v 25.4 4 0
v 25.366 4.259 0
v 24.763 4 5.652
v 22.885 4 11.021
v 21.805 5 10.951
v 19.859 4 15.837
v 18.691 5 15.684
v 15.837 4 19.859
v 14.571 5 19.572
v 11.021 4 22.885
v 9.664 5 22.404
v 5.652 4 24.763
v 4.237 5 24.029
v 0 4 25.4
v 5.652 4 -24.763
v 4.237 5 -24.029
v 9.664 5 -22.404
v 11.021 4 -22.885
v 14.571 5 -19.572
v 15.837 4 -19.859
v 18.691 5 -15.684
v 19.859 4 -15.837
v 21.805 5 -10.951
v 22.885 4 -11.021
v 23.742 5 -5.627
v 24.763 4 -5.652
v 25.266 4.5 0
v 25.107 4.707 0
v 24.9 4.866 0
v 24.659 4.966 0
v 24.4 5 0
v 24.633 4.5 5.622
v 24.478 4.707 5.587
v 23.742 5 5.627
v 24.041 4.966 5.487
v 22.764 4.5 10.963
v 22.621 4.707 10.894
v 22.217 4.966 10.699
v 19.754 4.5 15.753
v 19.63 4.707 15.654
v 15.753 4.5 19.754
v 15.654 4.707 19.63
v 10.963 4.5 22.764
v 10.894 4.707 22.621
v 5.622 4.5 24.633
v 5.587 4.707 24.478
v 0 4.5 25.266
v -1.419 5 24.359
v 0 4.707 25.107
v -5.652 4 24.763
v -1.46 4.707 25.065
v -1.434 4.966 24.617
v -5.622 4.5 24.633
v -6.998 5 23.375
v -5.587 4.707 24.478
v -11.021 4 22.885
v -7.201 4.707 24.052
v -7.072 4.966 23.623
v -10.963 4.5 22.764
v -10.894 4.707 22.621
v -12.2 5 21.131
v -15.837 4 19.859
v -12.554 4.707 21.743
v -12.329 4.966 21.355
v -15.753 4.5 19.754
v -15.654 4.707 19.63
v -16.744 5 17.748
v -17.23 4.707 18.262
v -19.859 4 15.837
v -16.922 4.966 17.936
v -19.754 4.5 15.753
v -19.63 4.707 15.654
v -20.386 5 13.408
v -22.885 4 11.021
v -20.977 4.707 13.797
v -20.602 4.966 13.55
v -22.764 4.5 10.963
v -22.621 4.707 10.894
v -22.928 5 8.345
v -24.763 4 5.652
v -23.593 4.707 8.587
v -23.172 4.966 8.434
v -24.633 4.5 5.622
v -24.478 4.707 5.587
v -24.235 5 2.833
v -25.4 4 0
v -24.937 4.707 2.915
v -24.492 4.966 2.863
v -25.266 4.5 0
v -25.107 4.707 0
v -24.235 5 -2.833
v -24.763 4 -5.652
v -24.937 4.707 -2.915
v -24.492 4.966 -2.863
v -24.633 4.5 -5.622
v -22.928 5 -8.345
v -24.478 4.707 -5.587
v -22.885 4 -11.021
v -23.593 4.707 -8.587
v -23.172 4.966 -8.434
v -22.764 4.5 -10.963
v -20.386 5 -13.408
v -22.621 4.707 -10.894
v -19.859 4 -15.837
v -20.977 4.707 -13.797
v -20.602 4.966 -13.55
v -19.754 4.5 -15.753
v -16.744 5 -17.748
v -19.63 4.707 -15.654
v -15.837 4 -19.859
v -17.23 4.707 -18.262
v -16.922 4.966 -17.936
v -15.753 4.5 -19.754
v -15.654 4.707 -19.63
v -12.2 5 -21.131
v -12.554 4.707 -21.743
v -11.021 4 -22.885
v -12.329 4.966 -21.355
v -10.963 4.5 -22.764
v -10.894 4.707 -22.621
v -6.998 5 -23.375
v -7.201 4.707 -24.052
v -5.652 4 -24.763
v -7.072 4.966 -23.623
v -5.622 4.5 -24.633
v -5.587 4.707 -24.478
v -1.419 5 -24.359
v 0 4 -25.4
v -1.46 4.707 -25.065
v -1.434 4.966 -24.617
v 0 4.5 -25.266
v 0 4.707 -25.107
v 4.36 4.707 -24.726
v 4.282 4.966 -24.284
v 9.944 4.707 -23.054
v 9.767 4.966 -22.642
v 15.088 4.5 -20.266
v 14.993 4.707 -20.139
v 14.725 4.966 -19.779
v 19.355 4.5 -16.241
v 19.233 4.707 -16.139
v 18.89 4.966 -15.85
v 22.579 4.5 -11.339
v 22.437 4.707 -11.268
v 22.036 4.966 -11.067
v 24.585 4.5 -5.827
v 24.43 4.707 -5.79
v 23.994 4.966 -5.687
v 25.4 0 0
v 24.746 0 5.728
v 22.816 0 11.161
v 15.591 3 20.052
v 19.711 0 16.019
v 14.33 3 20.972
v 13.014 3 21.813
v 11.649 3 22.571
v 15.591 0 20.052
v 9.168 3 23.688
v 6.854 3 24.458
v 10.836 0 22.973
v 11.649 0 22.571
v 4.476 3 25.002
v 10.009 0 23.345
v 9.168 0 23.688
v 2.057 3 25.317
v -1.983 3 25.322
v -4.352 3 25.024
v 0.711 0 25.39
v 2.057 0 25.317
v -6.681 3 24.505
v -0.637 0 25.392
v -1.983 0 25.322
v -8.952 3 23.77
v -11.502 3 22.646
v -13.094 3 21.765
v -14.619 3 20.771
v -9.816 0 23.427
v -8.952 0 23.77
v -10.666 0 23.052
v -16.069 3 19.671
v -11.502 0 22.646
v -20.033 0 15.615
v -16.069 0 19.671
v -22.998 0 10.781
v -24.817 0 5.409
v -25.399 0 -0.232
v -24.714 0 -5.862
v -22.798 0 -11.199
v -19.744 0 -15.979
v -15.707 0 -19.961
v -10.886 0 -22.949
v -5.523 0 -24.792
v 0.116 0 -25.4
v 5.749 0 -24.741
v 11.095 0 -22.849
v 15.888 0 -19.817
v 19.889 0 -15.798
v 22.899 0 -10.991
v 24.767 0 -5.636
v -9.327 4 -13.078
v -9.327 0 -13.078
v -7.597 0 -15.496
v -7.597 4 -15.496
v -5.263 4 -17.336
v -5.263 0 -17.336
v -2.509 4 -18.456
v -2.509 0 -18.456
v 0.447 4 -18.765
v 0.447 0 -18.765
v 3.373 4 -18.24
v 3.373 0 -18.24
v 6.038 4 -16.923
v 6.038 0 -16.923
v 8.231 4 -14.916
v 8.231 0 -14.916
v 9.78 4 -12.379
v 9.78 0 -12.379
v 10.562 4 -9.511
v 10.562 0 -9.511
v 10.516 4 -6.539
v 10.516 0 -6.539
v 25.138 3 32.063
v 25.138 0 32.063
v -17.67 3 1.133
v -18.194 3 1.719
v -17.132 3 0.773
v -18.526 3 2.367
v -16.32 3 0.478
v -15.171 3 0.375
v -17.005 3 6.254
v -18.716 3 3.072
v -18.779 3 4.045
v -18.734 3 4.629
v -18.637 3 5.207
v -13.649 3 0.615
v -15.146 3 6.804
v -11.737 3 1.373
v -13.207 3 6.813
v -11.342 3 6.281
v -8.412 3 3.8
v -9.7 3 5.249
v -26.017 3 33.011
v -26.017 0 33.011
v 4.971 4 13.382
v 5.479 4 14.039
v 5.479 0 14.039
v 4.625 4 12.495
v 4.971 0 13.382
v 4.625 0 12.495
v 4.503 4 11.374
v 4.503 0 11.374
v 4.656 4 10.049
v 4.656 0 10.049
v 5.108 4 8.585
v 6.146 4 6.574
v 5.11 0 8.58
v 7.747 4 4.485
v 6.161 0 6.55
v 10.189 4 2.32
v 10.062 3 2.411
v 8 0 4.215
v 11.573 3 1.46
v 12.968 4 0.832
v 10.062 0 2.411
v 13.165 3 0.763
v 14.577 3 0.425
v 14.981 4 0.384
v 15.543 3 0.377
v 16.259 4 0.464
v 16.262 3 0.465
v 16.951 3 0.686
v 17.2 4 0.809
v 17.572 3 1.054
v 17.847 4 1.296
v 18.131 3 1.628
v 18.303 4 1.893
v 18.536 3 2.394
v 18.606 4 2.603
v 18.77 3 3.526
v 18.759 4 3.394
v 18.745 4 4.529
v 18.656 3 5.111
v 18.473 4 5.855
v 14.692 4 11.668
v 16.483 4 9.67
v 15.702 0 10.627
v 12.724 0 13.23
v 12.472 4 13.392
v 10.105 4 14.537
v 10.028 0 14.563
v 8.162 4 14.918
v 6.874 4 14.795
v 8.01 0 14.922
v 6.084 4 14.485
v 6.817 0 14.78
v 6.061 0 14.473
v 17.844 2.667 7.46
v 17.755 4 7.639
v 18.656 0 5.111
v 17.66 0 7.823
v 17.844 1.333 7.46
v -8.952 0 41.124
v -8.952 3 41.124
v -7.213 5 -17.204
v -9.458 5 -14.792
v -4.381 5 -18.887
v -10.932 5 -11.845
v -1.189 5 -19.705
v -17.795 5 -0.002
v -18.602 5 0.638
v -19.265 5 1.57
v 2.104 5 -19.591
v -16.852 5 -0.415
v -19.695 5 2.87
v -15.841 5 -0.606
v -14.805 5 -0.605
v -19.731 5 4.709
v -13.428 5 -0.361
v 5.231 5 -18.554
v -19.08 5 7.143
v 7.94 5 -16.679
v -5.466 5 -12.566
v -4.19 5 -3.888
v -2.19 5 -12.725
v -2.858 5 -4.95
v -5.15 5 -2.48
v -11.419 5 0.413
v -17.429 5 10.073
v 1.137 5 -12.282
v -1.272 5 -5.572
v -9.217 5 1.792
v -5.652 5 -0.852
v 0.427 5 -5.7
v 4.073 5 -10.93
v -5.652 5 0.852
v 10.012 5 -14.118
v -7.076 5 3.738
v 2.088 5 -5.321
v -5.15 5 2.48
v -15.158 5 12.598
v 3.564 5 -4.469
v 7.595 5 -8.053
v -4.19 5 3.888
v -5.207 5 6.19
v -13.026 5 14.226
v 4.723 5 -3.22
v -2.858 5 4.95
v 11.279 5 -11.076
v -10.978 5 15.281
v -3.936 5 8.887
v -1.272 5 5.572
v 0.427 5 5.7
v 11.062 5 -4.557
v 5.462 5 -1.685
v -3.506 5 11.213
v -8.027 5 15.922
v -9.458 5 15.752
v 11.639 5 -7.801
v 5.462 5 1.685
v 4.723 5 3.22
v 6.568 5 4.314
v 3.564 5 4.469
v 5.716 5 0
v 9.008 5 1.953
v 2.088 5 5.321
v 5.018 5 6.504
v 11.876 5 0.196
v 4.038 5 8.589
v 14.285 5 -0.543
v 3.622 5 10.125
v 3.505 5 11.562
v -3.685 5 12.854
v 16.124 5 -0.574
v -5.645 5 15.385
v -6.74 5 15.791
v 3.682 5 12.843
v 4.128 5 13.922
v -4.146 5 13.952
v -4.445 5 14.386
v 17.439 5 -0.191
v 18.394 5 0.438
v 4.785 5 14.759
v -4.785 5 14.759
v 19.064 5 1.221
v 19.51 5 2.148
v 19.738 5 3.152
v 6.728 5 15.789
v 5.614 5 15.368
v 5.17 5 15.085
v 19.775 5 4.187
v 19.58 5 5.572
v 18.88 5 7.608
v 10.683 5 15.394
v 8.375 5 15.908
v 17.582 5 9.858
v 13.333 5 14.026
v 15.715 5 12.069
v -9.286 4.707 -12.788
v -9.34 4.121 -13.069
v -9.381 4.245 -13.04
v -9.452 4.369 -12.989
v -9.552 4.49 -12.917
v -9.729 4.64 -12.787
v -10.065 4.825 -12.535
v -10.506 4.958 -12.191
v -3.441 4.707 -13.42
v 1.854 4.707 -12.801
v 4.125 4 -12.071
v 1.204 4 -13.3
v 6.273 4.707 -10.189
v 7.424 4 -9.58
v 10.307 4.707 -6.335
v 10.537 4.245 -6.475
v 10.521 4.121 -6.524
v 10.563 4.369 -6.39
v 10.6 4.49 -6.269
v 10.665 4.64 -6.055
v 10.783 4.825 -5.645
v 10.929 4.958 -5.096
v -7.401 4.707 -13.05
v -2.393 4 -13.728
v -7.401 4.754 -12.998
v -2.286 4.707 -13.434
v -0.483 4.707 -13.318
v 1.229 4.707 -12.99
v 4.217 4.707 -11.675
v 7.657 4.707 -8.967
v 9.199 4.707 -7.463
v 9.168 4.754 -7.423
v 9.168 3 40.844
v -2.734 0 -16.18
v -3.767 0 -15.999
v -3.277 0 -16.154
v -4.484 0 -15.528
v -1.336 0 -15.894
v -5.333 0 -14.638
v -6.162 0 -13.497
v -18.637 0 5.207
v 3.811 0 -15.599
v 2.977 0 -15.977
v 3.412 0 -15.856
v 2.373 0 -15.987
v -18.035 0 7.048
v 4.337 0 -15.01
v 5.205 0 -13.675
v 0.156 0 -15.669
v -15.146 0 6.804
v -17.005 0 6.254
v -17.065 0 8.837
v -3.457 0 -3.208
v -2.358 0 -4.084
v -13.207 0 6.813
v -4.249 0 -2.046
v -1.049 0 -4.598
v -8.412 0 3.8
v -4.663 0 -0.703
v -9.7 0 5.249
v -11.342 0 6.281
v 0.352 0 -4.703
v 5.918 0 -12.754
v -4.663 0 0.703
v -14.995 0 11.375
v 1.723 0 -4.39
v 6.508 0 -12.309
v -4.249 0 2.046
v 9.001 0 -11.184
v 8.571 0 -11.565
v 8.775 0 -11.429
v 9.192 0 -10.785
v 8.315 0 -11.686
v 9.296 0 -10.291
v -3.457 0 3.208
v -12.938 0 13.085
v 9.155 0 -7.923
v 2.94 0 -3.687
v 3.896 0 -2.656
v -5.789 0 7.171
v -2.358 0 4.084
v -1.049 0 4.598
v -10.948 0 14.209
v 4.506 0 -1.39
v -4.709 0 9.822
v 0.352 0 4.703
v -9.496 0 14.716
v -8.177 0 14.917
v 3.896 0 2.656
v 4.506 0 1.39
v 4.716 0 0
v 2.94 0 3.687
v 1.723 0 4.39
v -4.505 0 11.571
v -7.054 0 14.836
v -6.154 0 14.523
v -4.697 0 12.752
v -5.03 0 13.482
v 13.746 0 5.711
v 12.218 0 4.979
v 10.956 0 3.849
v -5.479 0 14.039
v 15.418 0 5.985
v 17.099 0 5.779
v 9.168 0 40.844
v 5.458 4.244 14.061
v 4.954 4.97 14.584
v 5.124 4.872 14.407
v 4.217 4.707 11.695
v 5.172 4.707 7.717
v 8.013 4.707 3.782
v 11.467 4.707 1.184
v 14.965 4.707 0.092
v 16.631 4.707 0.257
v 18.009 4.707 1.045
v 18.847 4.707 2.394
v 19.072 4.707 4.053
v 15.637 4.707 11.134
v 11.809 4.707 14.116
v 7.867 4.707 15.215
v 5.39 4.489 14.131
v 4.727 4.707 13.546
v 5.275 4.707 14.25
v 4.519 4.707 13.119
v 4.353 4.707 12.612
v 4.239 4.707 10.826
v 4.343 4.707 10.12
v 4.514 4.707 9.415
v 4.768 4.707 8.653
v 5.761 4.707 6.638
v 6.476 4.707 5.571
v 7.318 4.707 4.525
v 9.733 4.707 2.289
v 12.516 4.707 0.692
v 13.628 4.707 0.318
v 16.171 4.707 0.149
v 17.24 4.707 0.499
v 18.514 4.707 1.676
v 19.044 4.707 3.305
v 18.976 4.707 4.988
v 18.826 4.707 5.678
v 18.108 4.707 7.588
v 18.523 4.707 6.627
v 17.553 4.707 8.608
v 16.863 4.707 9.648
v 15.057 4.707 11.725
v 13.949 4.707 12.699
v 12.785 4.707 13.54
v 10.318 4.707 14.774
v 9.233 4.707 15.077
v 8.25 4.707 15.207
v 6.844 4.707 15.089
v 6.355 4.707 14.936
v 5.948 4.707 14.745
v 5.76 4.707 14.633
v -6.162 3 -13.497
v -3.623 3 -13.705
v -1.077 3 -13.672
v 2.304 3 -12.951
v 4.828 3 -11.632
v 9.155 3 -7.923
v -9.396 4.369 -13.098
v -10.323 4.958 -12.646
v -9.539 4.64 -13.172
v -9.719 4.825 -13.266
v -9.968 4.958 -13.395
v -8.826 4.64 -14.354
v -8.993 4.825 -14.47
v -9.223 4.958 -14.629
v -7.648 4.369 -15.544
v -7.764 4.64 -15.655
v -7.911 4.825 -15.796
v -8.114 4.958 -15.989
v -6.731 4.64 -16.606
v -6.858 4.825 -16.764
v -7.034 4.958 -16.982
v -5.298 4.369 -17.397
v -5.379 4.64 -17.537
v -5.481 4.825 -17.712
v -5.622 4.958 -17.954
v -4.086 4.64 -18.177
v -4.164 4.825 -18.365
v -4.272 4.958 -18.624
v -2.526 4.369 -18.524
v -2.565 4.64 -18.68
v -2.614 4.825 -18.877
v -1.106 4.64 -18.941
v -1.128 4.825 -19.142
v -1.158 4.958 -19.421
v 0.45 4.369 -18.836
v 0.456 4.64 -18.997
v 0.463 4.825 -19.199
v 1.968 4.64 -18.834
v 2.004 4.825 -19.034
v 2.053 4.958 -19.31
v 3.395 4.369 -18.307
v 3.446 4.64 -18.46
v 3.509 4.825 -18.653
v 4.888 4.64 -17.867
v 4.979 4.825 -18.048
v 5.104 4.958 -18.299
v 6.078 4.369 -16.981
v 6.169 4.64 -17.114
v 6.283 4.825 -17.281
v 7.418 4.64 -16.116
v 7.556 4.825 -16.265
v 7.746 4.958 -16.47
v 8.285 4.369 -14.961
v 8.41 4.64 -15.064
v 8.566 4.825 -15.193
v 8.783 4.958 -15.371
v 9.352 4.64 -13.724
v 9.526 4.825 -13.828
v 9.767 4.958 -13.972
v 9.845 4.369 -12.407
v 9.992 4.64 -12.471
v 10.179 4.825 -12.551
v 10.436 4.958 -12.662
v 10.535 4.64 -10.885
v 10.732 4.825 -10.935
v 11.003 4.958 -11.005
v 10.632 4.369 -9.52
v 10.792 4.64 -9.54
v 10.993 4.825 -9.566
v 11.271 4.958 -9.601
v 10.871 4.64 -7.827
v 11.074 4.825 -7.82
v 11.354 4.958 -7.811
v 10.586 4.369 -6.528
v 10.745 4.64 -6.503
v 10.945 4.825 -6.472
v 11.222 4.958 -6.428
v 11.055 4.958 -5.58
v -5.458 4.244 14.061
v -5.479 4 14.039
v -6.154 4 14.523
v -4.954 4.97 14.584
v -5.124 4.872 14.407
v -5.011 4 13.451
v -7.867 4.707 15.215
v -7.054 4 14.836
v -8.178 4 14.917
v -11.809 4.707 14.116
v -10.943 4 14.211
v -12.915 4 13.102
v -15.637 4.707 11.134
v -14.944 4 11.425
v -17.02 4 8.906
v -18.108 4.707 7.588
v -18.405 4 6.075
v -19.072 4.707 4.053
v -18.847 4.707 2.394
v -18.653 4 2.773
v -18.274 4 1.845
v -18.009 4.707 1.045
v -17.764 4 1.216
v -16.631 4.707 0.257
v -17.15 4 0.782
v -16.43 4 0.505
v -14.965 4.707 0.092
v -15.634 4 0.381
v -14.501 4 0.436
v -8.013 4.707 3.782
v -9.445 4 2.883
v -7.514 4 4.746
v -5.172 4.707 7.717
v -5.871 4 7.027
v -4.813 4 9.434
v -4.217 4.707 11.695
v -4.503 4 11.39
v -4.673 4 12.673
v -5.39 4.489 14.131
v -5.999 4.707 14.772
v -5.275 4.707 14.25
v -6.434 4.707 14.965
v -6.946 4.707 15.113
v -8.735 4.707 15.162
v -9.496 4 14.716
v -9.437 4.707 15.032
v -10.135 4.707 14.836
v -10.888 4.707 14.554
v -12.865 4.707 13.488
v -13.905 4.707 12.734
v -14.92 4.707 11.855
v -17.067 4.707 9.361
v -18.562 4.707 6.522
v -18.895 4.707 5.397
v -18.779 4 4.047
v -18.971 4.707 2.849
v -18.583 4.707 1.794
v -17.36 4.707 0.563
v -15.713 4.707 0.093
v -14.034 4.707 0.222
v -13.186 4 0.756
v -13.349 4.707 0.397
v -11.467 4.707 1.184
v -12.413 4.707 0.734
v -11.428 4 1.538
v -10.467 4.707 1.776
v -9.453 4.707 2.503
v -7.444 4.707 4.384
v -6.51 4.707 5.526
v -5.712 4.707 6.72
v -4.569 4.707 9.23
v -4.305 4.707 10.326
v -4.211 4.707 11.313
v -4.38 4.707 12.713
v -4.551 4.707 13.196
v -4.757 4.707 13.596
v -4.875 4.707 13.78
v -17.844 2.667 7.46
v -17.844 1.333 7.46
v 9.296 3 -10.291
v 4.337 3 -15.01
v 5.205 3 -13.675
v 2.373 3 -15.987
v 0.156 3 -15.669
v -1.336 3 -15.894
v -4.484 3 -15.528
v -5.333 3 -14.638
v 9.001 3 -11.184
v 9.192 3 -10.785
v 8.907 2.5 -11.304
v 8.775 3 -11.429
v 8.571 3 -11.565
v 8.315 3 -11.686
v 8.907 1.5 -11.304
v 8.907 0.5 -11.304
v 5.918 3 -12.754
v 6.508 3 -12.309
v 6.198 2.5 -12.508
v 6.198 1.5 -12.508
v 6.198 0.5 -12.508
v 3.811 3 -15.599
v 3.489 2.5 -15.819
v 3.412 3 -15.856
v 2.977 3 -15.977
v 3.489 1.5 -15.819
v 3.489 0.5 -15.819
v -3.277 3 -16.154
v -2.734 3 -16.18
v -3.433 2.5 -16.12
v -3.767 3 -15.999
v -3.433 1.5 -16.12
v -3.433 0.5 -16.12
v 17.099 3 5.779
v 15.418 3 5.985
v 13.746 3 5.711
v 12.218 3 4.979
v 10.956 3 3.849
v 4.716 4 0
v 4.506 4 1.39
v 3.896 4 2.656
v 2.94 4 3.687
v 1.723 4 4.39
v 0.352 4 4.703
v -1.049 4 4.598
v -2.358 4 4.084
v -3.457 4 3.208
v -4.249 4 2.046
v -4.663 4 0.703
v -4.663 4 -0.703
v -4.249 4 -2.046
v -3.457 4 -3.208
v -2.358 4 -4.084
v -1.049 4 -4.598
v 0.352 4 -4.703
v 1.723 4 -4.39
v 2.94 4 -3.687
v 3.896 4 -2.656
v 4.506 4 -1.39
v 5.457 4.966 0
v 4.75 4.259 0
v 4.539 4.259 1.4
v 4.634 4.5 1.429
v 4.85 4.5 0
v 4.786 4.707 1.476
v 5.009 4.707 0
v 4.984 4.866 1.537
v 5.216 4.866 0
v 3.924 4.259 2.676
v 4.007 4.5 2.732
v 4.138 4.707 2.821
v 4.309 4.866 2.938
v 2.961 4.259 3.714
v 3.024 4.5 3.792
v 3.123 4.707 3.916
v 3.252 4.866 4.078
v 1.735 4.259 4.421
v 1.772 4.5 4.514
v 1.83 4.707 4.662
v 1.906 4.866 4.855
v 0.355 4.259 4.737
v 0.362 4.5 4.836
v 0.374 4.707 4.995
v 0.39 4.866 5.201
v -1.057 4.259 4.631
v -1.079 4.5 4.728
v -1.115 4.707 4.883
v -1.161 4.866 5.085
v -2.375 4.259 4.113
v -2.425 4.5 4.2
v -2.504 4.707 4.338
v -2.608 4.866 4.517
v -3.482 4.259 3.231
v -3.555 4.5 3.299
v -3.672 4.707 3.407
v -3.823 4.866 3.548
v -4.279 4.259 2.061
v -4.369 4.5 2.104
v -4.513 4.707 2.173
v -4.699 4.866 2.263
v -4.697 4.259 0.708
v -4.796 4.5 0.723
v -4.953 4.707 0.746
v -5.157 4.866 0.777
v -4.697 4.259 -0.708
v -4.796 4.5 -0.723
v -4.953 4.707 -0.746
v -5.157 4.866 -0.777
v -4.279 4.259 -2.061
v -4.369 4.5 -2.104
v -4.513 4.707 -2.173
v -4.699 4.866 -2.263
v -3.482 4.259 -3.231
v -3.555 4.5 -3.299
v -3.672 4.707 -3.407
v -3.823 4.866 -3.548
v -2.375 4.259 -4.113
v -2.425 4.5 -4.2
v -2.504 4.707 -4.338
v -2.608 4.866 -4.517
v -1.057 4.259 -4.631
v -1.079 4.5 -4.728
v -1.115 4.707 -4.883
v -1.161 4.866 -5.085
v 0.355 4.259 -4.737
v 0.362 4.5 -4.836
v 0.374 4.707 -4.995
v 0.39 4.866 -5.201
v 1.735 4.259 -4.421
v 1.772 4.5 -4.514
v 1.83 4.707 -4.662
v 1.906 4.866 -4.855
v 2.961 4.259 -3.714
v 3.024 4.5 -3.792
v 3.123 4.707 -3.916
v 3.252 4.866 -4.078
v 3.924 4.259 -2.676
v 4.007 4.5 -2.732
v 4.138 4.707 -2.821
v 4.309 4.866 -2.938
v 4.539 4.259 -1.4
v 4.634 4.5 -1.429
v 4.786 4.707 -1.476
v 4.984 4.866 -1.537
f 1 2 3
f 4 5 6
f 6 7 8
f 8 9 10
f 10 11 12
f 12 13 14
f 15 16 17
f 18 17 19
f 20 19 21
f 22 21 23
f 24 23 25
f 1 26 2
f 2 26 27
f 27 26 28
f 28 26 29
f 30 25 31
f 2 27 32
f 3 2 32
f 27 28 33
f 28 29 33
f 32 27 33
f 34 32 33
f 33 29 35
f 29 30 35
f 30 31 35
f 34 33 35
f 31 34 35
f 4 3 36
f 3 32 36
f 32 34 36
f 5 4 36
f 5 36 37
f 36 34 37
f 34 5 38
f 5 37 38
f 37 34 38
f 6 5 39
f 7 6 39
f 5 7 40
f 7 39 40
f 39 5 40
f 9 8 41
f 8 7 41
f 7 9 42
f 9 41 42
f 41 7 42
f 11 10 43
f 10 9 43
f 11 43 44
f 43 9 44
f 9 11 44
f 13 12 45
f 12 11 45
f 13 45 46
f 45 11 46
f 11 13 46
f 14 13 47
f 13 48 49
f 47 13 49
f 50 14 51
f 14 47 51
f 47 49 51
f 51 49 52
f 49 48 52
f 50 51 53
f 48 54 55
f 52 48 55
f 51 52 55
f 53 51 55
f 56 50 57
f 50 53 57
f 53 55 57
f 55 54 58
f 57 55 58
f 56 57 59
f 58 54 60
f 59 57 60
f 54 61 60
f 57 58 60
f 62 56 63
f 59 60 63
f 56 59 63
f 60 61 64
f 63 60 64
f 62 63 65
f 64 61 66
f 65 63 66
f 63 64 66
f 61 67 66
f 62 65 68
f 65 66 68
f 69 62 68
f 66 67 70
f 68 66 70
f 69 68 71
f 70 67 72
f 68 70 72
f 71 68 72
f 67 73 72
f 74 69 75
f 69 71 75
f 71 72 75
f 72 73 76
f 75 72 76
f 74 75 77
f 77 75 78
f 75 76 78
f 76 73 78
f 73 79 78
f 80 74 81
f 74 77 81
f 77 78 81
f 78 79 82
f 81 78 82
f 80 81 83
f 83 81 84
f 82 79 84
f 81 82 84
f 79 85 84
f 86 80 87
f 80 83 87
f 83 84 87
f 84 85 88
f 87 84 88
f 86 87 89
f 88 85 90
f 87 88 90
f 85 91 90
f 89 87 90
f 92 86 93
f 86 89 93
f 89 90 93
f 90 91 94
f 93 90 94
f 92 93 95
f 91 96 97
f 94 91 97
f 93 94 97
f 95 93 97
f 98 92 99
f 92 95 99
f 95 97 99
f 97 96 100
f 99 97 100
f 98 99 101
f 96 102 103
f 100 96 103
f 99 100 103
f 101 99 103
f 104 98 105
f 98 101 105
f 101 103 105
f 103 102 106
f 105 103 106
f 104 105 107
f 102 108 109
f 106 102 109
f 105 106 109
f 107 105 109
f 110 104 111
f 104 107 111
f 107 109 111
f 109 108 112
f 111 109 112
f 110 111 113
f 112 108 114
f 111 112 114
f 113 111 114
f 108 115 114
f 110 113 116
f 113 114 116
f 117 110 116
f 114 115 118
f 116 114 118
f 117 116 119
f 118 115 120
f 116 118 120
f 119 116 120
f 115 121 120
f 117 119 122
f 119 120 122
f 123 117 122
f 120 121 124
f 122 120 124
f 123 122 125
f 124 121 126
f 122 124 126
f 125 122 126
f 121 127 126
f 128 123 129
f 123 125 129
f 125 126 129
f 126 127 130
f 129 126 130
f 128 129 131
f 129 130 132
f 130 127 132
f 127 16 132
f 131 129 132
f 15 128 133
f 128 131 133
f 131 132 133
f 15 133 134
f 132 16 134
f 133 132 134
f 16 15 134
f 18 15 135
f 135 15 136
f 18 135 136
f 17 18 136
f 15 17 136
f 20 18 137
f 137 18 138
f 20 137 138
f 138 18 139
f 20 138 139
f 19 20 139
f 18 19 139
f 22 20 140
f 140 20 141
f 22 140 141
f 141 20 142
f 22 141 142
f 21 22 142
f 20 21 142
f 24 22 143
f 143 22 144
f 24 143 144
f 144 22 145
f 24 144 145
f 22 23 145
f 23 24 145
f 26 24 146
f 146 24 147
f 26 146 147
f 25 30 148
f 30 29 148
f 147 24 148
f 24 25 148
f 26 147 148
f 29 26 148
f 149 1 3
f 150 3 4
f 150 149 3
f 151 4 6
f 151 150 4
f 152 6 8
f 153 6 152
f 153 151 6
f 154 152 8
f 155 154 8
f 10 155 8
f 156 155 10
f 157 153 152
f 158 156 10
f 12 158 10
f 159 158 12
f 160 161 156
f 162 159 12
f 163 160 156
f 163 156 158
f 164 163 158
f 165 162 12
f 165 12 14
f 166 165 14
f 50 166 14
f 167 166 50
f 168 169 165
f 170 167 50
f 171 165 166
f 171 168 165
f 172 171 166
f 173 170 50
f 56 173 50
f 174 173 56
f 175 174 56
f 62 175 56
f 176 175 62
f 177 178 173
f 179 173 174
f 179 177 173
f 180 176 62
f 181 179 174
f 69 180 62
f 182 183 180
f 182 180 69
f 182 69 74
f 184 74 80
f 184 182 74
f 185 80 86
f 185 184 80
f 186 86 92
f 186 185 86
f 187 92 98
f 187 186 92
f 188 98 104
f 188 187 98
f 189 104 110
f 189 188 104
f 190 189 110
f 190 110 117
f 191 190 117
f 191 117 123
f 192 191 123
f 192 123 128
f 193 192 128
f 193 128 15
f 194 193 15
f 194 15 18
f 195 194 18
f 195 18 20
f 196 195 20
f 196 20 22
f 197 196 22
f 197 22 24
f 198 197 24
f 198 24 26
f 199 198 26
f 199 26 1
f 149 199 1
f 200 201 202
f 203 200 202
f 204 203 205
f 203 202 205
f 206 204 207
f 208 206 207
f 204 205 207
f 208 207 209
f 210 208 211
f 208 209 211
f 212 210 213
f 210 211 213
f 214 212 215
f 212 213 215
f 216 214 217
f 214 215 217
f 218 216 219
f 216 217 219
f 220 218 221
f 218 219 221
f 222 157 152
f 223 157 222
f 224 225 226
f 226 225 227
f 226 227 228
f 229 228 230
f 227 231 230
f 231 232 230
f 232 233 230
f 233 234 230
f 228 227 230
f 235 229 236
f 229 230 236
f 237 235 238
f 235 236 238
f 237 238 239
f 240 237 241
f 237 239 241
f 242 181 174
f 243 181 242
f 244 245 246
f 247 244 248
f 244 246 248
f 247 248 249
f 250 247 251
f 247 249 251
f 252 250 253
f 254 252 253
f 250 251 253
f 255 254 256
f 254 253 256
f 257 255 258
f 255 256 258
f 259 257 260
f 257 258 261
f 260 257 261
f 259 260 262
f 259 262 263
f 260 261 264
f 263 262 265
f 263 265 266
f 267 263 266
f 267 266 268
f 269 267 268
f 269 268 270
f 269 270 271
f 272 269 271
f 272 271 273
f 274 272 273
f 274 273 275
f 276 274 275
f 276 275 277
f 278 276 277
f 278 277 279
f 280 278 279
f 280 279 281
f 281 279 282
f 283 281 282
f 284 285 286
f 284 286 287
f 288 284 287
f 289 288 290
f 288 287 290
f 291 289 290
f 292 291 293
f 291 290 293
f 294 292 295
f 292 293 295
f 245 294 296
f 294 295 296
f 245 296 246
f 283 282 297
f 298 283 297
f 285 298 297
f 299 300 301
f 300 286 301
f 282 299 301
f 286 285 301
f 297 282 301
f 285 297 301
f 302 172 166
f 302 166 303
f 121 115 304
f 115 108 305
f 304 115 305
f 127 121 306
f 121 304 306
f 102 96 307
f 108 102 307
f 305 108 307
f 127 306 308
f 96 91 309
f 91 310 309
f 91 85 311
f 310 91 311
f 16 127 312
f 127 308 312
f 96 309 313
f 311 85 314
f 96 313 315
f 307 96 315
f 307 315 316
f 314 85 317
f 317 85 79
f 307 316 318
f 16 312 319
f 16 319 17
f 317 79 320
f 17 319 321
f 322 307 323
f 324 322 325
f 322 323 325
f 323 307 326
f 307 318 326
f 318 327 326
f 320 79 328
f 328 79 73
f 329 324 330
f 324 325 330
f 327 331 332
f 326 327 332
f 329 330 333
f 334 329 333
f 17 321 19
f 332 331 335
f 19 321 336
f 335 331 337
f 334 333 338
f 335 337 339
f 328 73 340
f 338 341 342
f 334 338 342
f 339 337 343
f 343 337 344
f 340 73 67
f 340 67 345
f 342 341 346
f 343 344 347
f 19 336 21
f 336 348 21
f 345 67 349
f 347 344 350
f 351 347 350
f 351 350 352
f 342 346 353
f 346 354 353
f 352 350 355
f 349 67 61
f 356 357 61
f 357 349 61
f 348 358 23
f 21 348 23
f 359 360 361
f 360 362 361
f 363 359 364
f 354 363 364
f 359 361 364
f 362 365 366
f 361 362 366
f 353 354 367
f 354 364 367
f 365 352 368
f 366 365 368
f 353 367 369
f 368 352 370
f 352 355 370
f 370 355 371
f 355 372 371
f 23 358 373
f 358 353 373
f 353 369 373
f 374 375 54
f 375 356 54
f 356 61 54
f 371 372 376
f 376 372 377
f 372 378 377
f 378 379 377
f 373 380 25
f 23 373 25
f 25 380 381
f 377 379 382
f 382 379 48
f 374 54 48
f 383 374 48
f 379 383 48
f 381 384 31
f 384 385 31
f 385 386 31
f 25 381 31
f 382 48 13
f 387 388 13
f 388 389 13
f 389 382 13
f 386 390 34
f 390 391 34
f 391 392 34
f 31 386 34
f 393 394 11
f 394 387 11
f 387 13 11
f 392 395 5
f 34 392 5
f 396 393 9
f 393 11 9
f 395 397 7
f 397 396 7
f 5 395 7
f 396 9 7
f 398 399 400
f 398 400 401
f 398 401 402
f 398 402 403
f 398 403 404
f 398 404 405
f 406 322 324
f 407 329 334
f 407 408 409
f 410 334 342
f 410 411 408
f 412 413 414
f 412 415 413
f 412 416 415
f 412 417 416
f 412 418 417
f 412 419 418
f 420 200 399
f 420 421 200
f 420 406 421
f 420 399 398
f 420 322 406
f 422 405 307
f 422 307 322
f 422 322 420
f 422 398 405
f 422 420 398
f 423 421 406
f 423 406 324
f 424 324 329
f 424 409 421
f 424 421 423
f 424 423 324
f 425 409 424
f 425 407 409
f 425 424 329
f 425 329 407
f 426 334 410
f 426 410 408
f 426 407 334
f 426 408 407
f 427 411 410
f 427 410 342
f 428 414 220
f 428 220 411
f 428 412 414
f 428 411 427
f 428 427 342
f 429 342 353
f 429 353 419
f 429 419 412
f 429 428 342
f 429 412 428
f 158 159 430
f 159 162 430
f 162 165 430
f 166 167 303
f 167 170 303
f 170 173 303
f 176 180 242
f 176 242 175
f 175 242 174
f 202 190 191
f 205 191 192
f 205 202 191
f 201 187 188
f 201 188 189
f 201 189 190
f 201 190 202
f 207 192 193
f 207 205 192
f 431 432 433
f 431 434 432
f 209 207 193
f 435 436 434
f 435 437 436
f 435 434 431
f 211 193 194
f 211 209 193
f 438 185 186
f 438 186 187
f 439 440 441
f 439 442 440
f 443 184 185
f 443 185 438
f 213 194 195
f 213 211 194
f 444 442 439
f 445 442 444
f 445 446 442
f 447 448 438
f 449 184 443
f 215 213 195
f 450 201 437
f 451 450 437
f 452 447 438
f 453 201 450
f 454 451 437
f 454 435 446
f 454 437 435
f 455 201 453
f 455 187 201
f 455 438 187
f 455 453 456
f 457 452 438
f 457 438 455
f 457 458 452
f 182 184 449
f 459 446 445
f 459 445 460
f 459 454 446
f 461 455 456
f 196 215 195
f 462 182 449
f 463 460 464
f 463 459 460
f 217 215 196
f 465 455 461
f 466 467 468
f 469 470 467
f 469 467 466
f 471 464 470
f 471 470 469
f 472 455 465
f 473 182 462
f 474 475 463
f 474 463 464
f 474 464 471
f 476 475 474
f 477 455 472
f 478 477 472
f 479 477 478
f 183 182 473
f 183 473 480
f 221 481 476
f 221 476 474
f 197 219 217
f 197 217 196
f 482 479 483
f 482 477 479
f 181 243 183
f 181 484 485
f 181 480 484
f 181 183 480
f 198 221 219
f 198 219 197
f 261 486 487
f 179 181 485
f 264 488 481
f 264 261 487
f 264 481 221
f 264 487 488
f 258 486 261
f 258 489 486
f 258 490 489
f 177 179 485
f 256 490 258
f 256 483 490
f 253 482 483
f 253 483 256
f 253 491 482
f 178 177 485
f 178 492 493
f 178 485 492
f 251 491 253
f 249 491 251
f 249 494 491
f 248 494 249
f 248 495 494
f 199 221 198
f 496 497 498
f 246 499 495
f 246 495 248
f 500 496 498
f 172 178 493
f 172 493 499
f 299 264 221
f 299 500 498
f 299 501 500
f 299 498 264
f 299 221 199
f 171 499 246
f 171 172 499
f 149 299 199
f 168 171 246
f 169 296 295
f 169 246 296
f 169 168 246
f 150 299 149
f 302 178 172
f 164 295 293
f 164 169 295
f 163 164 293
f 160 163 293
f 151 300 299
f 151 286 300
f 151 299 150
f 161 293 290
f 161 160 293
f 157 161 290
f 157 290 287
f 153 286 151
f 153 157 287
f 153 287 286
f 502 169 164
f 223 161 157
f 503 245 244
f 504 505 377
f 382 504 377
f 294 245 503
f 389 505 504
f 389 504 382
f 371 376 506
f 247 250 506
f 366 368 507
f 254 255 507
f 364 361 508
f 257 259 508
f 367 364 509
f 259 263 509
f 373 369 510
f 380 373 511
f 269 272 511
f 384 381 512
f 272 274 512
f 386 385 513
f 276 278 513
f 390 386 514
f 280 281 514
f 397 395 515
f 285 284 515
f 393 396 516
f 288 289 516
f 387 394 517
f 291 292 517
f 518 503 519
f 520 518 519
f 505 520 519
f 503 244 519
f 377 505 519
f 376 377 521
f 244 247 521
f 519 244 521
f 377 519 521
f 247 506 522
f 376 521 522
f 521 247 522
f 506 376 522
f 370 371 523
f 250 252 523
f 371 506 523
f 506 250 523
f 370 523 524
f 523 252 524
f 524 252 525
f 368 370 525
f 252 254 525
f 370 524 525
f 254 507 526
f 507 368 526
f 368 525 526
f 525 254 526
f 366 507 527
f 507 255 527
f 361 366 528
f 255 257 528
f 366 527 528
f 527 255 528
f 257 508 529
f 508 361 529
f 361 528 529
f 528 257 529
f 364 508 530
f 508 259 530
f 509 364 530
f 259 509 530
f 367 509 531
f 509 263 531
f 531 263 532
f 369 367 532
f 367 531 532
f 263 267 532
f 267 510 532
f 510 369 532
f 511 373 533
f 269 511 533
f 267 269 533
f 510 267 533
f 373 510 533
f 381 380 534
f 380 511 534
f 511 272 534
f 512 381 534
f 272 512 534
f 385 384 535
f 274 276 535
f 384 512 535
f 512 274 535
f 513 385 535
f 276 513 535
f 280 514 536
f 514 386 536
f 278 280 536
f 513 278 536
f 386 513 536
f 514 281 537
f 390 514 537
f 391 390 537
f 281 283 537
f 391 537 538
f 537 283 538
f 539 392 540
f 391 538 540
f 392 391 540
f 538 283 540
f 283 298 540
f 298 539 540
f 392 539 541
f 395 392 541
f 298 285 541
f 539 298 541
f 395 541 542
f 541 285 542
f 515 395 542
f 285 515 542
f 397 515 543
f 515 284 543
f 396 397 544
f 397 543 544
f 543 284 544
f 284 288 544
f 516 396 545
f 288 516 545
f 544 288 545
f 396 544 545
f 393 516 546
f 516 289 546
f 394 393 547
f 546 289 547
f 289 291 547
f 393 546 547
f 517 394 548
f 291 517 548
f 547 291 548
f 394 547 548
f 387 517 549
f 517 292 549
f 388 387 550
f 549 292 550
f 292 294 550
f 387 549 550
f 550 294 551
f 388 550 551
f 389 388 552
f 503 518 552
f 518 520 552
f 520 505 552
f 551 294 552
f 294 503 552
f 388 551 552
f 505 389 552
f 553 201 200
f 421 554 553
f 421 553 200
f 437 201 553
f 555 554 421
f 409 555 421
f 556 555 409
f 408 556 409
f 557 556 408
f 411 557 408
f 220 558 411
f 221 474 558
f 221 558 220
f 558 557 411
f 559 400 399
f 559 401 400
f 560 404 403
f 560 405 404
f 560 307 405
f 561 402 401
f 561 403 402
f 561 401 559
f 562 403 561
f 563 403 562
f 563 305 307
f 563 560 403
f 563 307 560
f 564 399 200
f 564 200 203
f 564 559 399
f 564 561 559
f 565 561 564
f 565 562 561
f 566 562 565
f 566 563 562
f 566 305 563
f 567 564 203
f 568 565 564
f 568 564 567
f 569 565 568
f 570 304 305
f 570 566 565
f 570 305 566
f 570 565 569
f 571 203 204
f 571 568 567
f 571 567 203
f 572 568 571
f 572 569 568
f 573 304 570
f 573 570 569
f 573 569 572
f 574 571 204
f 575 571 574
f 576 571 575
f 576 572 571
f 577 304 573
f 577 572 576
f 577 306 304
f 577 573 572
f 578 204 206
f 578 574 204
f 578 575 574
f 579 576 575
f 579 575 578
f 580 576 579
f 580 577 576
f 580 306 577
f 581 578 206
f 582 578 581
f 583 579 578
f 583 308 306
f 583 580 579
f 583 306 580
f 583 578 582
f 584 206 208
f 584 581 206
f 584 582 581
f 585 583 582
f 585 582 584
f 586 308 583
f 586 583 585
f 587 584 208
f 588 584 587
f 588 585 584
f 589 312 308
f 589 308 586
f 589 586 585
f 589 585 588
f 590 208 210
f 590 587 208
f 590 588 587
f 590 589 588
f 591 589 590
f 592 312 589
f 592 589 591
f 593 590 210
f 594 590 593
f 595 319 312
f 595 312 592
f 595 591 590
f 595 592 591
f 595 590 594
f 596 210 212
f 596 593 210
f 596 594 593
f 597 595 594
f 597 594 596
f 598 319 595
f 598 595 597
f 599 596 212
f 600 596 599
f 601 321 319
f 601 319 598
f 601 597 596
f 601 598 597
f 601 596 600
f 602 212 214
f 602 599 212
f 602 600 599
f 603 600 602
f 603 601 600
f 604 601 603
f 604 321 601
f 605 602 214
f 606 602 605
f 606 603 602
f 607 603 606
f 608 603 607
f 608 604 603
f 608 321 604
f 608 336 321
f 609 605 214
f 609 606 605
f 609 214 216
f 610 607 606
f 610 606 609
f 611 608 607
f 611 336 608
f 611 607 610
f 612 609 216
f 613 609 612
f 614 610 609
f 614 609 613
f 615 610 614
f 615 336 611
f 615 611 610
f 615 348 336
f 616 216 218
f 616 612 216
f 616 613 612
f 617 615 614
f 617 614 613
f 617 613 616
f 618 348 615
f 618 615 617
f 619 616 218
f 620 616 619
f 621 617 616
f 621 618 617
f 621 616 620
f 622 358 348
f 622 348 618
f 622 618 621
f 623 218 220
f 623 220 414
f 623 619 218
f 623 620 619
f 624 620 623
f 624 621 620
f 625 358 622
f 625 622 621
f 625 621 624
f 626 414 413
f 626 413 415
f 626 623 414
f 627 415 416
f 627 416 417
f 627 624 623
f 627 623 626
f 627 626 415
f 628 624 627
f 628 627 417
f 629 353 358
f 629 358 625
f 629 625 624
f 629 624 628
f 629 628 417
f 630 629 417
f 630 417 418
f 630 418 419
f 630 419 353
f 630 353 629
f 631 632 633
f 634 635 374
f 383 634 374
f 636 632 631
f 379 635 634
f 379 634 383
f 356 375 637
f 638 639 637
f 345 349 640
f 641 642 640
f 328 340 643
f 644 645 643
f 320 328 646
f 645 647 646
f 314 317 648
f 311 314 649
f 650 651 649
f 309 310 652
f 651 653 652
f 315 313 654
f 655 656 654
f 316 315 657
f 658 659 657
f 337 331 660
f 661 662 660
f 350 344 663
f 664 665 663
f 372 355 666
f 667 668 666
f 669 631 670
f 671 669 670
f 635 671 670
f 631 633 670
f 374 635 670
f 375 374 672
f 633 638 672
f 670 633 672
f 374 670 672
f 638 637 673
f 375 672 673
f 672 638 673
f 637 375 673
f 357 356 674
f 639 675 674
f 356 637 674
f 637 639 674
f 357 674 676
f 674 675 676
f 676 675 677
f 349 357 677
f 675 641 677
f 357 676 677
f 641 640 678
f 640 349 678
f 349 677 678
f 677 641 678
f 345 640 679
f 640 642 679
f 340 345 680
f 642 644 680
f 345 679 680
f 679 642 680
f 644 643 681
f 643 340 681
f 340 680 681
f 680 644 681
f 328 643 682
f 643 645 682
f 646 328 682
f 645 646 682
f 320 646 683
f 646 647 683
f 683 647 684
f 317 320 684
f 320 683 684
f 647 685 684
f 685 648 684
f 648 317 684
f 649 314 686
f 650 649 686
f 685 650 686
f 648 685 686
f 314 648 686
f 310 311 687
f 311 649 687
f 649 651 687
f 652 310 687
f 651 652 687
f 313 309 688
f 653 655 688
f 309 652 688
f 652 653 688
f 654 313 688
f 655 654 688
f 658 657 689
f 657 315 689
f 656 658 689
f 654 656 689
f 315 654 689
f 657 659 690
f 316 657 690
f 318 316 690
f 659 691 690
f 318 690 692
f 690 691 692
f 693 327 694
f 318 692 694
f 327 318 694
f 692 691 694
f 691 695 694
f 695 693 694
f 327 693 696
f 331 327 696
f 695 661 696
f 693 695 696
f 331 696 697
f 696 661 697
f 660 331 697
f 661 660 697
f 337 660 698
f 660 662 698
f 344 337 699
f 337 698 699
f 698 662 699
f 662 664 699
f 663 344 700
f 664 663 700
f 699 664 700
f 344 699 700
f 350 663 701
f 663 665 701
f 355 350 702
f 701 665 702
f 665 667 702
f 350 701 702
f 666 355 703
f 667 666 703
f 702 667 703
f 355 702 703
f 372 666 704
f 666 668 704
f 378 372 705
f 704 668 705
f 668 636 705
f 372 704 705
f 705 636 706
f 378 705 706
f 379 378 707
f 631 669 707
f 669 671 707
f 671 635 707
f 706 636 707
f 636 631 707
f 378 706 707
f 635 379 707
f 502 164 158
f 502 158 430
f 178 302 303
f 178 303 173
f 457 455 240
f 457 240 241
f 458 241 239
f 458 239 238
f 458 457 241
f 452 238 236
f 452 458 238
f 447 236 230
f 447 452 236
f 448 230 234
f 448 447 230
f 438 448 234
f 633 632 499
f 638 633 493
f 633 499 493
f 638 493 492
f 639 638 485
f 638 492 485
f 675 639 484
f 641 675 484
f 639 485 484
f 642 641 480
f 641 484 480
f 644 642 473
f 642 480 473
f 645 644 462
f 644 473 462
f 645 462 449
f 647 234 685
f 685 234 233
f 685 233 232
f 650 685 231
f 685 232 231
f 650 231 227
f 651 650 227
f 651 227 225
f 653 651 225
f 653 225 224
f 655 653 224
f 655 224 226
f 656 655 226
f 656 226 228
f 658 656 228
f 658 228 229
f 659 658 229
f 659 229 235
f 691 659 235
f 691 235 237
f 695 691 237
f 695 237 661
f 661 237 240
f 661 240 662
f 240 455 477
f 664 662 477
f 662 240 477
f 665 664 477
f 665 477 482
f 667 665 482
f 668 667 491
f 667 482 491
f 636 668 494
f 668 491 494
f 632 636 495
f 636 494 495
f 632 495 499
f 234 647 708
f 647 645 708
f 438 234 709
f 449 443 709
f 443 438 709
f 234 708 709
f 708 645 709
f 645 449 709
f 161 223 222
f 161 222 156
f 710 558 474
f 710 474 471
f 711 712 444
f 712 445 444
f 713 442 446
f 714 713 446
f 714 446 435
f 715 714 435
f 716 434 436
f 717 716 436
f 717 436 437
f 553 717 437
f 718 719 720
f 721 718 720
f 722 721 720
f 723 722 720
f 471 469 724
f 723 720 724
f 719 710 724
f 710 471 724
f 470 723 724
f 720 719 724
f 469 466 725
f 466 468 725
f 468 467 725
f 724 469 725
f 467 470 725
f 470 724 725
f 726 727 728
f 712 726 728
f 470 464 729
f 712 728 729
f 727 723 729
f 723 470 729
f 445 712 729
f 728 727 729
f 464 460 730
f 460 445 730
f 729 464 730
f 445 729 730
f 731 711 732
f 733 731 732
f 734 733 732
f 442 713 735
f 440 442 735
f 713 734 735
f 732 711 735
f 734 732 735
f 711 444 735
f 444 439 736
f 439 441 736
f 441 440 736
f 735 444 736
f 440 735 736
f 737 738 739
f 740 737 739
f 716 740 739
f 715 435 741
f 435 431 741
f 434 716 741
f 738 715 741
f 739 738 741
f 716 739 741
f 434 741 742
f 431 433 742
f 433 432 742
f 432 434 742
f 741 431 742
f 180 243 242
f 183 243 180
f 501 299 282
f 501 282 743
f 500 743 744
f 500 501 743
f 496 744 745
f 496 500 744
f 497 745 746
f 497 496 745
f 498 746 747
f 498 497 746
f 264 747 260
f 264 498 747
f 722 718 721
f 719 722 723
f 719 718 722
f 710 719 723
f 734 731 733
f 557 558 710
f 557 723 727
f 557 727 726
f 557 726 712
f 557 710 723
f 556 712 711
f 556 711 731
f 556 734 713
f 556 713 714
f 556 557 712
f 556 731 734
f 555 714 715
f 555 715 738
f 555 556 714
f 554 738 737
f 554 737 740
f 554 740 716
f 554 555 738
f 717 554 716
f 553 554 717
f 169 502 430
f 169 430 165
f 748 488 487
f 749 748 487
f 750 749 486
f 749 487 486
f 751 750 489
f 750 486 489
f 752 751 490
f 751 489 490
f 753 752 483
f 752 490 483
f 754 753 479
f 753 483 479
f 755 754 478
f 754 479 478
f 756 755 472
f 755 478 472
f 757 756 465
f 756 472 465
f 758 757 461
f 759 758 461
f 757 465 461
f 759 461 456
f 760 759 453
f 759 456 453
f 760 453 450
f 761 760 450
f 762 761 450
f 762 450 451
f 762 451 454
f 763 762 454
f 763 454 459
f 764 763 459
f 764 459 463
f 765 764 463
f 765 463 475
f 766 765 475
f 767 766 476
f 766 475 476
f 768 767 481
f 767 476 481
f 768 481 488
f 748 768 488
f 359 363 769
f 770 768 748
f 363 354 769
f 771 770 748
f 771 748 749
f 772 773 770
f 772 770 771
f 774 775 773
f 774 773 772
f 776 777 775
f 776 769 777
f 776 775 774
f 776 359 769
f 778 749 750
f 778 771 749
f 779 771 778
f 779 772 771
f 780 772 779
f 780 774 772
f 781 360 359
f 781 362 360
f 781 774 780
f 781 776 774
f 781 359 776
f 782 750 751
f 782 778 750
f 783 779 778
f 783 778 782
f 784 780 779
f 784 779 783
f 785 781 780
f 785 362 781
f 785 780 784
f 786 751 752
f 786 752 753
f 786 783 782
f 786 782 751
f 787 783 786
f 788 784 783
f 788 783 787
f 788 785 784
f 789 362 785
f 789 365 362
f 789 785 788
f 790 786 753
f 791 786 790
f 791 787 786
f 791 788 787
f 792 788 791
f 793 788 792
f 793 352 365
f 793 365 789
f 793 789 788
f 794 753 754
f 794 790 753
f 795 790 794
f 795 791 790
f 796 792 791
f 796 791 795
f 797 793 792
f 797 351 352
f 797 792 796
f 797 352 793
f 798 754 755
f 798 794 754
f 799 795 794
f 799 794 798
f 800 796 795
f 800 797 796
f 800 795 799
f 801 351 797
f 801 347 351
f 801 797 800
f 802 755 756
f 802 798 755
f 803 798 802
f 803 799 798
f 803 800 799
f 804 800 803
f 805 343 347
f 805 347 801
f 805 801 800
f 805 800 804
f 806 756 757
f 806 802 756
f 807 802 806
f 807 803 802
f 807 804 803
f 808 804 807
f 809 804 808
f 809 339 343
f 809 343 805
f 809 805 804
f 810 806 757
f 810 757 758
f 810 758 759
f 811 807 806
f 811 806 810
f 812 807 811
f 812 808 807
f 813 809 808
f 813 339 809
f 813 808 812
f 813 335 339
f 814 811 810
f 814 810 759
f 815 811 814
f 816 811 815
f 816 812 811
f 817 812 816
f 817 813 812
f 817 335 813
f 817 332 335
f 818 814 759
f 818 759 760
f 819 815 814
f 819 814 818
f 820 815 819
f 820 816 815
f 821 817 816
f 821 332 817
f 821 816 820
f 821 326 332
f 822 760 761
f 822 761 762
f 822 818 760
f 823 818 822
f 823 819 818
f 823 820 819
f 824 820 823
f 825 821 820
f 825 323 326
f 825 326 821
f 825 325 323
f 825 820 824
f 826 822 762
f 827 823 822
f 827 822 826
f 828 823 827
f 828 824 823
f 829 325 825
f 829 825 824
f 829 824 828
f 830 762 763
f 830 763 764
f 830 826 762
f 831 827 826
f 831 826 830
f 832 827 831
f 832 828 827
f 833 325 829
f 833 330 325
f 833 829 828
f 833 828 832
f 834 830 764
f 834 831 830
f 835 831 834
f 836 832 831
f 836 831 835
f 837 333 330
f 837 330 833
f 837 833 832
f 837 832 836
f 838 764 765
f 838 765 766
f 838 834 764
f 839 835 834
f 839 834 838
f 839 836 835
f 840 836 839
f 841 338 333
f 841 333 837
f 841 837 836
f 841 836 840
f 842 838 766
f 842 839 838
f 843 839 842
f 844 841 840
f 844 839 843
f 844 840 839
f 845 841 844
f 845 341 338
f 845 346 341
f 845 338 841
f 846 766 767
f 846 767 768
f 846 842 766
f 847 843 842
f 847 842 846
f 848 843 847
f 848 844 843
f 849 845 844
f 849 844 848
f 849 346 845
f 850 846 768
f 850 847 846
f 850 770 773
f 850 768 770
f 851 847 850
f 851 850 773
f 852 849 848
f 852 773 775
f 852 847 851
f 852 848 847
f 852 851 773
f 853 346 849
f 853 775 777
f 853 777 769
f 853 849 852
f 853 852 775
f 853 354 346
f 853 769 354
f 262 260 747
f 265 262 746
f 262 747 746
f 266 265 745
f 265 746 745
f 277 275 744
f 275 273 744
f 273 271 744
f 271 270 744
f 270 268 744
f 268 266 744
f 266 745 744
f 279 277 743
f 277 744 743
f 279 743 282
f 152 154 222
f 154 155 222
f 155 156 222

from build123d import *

# Parameters (mm, degrees)
F0_R     = 25.4
F1_DEPTH = 5
F2_R     = 4.7157463605
F3_DEPTH = 5
F4_R     = 5.9858344823
F4_R_2   = 6.8771684103
F5_DEPTH = 3
F6_R     = 1


# Not quite as in the source:
# - a feature names something its author has since deleted; it is built from what else it names


with BuildPart() as f1:
    # F0 (on Front) → F1 (new body)
    with BuildSketch(Plane.XZ):
        Circle(F0_R)
    extrude(amount=-F1_DEPTH)

    # F2 (on face) → F3 (cut)
    with BuildSketch(Plane.XZ):
        with BuildLine():
            add(Edge.make_bspline(
                [(5.4787751287, 14.0393581241), (-0.7613644186, 8.0220805736), (11.6041345431, 1.4428670645), (23.9696335047, -5.1363464445), (17.8442740904, 7.4601446151), (11.7189146761, 20.0566356747), (5.4787751287, 14.0393581241)],
                knots=[0, 0, 0, 2.0943951024, 2.0943951024, 4.1887902048, 4.1887902048, 6.2831853072, 6.2831853072, 6.2831853072], degree=2, weights=[1, 0.5, 1, 0.5, 1, 0.5, 1]))
        make_face()
        with BuildLine():
            add(Edge.make_bspline(
                [(-5.4787751287, 14.0393581241), (-11.7189146761, 20.0566356747), (-17.8442740904, 7.4601446151), (-23.9696335047, -5.1363464445), (-11.6041345431, 1.4428670645), (0.7613644186, 8.0220805736), (-5.4787751287, 14.0393581241)],
                knots=[0, 0, 0, 2.0943951024, 2.0943951024, 4.1887902048, 4.1887902048, 6.2831853072, 6.2831853072, 6.2831853072], degree=2, weights=[1, 0.5, 1, 0.5, 1, 0.5, 1]))
        make_face()
        with BuildLine():
            add(Edge.make_bspline(
                [(-9.3268435448, -13.0783319473), (-5.3570947234, -13.6419163621), (2.4941538192, -14.7565564853), (7.8622633612, -9.2576925536), (10.5161489919, -6.5391645767)],
                knots=[0, 0, 0, 0, 0.5056200679, 1, 1, 1, 1], degree=3))
            ThreePointArc((-9.3268435448, -13.0783319473), (3.3732506378, -18.2403565311), (10.5161489919, -6.5391645767))
        make_face()
        Circle(F2_R)
    extrude(amount=-F3_DEPTH, mode=Mode.SUBTRACT)

    # F4 (on Front) → F5 (join)
    with BuildSketch(Plane.XZ):
        Polygon((6.3790107723, 19.2006488251), (14.1368918121, 18.2225890458), (25.1383651048, 32.0631526411), (9.1684851795, 20.8250880241), (9.1684851795, 40.8442690969), (0, 20.8250880241), (-8.9521687478, 41.1240197718), (-8.9521687478, 20.8250880241), (-26.0172411799, 33.0111198127), (-13.7080065906, 16.5055599064), (-6.5881432822, 19.6455388269), (0.2679300325, 16.5055599064), align=None)
        with BuildLine():
            add(Edge.make_bspline(
                [(8.9071877301, -6.488062907), (9.2703313456, -8.4935320624), (9.9183873881, -12.0724367943), (5.6068314116, -11.6988309368), (4.0025303305, -17.0425236956), (-0.0779493441, -14.9823882563), (-3.872275032, -17.3296154794), (-6.088223658, -13.6780769927), (-7.3463311419, -11.6049116477)],
                knots=[0, 0, 0, 0, 0.180490001, 0.3220974589, 0.4922078924, 0.6459136955, 0.798967077, 1, 1, 1, 1], degree=3))
            Line((8.9071877301, -6.488062907), (0, -11.6049116477))
            Line((0, -11.6049116477), (-7.3463311419, -11.6049116477))
        make_face()
        with Locations((15.5406650156, 0)):
            Circle(F4_R)
        with Locations((-14.1438068822, 0)):
            Circle(F4_R_2)
    extrude(amount=-F5_DEPTH)

    # F6
    f6_edges = [f1.edges().sort_by_distance(p)[0] for p in [
        (-25.4, 5, 0),
        (1.711486, 5, -13.155),
        (3.373251, 5, -18.240357),
        (-4.715746, 5, 0),
        (-17.806014, 5, 1.255555),
        (17.806014, 5, 1.255555),
    ]]
    fillet(f6_edges, radius=F6_R)


solid = f1.part
